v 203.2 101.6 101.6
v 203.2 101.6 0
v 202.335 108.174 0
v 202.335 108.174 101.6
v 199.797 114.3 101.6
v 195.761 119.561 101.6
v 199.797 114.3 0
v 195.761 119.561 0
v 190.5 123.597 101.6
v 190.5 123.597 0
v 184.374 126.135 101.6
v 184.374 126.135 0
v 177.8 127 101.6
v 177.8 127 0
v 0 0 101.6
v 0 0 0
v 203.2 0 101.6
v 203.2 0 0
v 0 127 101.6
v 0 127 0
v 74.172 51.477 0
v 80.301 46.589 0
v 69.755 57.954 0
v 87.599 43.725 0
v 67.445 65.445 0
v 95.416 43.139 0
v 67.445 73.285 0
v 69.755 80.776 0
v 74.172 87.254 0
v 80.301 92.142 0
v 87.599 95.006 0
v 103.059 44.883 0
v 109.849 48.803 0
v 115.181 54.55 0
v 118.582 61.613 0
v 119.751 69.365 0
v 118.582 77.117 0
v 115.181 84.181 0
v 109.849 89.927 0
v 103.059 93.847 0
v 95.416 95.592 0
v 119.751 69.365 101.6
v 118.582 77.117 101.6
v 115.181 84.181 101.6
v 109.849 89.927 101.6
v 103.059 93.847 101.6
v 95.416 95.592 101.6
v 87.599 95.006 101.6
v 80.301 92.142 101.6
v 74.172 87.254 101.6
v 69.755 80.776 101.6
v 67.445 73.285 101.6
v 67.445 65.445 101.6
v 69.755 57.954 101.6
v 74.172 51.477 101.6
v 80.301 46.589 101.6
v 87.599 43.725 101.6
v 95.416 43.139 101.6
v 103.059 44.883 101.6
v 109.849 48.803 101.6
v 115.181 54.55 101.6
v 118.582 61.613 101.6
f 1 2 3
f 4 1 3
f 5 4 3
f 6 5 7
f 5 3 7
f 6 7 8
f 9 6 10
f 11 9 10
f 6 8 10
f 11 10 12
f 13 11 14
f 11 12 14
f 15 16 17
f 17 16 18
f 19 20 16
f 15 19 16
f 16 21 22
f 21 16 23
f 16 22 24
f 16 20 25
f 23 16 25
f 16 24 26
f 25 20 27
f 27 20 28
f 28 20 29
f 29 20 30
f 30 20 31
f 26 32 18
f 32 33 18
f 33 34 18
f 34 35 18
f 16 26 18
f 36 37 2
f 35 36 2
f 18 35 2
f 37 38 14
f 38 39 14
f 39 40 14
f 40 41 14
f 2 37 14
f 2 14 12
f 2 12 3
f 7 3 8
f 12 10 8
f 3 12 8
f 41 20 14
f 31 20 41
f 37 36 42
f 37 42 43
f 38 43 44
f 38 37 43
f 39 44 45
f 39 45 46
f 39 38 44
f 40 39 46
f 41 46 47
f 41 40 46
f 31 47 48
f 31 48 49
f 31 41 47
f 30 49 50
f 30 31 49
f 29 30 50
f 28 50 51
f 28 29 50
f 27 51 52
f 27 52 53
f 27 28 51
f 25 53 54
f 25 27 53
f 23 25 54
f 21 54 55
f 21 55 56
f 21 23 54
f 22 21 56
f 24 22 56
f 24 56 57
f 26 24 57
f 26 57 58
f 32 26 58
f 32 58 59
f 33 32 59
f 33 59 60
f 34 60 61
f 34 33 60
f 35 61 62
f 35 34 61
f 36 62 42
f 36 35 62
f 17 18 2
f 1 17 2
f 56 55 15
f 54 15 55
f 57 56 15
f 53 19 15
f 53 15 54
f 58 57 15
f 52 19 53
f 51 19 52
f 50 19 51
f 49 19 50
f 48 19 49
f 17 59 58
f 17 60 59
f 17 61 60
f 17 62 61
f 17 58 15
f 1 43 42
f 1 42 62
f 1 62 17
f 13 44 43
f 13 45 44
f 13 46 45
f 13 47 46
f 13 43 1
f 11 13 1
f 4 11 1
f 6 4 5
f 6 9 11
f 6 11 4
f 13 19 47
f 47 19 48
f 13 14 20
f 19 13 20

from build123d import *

# Parameters (mm, degrees)
F0_R     = 26.300006
F1_DEPTH = 101.6


with BuildPart() as f1:
    # F0 (on Top) → F1 (new body)
    with BuildSketch(Plane.XY):
        with BuildLine():
            Line((0, 127), (0, 0))
            Line((0, 0), (203.2, 0))
            Line((203.2, 0), (203.2, 101.6))
            ThreePointArc((203.2, 101.6), (195.760512, 119.560512), (177.8, 127))
            Line((177.8, 127), (0, 127))
        make_face()
        with Locations((93.450926, 69.365256)):
            Circle(F0_R, mode=Mode.SUBTRACT)
    extrude(amount=F1_DEPTH)


solid = f1.part
